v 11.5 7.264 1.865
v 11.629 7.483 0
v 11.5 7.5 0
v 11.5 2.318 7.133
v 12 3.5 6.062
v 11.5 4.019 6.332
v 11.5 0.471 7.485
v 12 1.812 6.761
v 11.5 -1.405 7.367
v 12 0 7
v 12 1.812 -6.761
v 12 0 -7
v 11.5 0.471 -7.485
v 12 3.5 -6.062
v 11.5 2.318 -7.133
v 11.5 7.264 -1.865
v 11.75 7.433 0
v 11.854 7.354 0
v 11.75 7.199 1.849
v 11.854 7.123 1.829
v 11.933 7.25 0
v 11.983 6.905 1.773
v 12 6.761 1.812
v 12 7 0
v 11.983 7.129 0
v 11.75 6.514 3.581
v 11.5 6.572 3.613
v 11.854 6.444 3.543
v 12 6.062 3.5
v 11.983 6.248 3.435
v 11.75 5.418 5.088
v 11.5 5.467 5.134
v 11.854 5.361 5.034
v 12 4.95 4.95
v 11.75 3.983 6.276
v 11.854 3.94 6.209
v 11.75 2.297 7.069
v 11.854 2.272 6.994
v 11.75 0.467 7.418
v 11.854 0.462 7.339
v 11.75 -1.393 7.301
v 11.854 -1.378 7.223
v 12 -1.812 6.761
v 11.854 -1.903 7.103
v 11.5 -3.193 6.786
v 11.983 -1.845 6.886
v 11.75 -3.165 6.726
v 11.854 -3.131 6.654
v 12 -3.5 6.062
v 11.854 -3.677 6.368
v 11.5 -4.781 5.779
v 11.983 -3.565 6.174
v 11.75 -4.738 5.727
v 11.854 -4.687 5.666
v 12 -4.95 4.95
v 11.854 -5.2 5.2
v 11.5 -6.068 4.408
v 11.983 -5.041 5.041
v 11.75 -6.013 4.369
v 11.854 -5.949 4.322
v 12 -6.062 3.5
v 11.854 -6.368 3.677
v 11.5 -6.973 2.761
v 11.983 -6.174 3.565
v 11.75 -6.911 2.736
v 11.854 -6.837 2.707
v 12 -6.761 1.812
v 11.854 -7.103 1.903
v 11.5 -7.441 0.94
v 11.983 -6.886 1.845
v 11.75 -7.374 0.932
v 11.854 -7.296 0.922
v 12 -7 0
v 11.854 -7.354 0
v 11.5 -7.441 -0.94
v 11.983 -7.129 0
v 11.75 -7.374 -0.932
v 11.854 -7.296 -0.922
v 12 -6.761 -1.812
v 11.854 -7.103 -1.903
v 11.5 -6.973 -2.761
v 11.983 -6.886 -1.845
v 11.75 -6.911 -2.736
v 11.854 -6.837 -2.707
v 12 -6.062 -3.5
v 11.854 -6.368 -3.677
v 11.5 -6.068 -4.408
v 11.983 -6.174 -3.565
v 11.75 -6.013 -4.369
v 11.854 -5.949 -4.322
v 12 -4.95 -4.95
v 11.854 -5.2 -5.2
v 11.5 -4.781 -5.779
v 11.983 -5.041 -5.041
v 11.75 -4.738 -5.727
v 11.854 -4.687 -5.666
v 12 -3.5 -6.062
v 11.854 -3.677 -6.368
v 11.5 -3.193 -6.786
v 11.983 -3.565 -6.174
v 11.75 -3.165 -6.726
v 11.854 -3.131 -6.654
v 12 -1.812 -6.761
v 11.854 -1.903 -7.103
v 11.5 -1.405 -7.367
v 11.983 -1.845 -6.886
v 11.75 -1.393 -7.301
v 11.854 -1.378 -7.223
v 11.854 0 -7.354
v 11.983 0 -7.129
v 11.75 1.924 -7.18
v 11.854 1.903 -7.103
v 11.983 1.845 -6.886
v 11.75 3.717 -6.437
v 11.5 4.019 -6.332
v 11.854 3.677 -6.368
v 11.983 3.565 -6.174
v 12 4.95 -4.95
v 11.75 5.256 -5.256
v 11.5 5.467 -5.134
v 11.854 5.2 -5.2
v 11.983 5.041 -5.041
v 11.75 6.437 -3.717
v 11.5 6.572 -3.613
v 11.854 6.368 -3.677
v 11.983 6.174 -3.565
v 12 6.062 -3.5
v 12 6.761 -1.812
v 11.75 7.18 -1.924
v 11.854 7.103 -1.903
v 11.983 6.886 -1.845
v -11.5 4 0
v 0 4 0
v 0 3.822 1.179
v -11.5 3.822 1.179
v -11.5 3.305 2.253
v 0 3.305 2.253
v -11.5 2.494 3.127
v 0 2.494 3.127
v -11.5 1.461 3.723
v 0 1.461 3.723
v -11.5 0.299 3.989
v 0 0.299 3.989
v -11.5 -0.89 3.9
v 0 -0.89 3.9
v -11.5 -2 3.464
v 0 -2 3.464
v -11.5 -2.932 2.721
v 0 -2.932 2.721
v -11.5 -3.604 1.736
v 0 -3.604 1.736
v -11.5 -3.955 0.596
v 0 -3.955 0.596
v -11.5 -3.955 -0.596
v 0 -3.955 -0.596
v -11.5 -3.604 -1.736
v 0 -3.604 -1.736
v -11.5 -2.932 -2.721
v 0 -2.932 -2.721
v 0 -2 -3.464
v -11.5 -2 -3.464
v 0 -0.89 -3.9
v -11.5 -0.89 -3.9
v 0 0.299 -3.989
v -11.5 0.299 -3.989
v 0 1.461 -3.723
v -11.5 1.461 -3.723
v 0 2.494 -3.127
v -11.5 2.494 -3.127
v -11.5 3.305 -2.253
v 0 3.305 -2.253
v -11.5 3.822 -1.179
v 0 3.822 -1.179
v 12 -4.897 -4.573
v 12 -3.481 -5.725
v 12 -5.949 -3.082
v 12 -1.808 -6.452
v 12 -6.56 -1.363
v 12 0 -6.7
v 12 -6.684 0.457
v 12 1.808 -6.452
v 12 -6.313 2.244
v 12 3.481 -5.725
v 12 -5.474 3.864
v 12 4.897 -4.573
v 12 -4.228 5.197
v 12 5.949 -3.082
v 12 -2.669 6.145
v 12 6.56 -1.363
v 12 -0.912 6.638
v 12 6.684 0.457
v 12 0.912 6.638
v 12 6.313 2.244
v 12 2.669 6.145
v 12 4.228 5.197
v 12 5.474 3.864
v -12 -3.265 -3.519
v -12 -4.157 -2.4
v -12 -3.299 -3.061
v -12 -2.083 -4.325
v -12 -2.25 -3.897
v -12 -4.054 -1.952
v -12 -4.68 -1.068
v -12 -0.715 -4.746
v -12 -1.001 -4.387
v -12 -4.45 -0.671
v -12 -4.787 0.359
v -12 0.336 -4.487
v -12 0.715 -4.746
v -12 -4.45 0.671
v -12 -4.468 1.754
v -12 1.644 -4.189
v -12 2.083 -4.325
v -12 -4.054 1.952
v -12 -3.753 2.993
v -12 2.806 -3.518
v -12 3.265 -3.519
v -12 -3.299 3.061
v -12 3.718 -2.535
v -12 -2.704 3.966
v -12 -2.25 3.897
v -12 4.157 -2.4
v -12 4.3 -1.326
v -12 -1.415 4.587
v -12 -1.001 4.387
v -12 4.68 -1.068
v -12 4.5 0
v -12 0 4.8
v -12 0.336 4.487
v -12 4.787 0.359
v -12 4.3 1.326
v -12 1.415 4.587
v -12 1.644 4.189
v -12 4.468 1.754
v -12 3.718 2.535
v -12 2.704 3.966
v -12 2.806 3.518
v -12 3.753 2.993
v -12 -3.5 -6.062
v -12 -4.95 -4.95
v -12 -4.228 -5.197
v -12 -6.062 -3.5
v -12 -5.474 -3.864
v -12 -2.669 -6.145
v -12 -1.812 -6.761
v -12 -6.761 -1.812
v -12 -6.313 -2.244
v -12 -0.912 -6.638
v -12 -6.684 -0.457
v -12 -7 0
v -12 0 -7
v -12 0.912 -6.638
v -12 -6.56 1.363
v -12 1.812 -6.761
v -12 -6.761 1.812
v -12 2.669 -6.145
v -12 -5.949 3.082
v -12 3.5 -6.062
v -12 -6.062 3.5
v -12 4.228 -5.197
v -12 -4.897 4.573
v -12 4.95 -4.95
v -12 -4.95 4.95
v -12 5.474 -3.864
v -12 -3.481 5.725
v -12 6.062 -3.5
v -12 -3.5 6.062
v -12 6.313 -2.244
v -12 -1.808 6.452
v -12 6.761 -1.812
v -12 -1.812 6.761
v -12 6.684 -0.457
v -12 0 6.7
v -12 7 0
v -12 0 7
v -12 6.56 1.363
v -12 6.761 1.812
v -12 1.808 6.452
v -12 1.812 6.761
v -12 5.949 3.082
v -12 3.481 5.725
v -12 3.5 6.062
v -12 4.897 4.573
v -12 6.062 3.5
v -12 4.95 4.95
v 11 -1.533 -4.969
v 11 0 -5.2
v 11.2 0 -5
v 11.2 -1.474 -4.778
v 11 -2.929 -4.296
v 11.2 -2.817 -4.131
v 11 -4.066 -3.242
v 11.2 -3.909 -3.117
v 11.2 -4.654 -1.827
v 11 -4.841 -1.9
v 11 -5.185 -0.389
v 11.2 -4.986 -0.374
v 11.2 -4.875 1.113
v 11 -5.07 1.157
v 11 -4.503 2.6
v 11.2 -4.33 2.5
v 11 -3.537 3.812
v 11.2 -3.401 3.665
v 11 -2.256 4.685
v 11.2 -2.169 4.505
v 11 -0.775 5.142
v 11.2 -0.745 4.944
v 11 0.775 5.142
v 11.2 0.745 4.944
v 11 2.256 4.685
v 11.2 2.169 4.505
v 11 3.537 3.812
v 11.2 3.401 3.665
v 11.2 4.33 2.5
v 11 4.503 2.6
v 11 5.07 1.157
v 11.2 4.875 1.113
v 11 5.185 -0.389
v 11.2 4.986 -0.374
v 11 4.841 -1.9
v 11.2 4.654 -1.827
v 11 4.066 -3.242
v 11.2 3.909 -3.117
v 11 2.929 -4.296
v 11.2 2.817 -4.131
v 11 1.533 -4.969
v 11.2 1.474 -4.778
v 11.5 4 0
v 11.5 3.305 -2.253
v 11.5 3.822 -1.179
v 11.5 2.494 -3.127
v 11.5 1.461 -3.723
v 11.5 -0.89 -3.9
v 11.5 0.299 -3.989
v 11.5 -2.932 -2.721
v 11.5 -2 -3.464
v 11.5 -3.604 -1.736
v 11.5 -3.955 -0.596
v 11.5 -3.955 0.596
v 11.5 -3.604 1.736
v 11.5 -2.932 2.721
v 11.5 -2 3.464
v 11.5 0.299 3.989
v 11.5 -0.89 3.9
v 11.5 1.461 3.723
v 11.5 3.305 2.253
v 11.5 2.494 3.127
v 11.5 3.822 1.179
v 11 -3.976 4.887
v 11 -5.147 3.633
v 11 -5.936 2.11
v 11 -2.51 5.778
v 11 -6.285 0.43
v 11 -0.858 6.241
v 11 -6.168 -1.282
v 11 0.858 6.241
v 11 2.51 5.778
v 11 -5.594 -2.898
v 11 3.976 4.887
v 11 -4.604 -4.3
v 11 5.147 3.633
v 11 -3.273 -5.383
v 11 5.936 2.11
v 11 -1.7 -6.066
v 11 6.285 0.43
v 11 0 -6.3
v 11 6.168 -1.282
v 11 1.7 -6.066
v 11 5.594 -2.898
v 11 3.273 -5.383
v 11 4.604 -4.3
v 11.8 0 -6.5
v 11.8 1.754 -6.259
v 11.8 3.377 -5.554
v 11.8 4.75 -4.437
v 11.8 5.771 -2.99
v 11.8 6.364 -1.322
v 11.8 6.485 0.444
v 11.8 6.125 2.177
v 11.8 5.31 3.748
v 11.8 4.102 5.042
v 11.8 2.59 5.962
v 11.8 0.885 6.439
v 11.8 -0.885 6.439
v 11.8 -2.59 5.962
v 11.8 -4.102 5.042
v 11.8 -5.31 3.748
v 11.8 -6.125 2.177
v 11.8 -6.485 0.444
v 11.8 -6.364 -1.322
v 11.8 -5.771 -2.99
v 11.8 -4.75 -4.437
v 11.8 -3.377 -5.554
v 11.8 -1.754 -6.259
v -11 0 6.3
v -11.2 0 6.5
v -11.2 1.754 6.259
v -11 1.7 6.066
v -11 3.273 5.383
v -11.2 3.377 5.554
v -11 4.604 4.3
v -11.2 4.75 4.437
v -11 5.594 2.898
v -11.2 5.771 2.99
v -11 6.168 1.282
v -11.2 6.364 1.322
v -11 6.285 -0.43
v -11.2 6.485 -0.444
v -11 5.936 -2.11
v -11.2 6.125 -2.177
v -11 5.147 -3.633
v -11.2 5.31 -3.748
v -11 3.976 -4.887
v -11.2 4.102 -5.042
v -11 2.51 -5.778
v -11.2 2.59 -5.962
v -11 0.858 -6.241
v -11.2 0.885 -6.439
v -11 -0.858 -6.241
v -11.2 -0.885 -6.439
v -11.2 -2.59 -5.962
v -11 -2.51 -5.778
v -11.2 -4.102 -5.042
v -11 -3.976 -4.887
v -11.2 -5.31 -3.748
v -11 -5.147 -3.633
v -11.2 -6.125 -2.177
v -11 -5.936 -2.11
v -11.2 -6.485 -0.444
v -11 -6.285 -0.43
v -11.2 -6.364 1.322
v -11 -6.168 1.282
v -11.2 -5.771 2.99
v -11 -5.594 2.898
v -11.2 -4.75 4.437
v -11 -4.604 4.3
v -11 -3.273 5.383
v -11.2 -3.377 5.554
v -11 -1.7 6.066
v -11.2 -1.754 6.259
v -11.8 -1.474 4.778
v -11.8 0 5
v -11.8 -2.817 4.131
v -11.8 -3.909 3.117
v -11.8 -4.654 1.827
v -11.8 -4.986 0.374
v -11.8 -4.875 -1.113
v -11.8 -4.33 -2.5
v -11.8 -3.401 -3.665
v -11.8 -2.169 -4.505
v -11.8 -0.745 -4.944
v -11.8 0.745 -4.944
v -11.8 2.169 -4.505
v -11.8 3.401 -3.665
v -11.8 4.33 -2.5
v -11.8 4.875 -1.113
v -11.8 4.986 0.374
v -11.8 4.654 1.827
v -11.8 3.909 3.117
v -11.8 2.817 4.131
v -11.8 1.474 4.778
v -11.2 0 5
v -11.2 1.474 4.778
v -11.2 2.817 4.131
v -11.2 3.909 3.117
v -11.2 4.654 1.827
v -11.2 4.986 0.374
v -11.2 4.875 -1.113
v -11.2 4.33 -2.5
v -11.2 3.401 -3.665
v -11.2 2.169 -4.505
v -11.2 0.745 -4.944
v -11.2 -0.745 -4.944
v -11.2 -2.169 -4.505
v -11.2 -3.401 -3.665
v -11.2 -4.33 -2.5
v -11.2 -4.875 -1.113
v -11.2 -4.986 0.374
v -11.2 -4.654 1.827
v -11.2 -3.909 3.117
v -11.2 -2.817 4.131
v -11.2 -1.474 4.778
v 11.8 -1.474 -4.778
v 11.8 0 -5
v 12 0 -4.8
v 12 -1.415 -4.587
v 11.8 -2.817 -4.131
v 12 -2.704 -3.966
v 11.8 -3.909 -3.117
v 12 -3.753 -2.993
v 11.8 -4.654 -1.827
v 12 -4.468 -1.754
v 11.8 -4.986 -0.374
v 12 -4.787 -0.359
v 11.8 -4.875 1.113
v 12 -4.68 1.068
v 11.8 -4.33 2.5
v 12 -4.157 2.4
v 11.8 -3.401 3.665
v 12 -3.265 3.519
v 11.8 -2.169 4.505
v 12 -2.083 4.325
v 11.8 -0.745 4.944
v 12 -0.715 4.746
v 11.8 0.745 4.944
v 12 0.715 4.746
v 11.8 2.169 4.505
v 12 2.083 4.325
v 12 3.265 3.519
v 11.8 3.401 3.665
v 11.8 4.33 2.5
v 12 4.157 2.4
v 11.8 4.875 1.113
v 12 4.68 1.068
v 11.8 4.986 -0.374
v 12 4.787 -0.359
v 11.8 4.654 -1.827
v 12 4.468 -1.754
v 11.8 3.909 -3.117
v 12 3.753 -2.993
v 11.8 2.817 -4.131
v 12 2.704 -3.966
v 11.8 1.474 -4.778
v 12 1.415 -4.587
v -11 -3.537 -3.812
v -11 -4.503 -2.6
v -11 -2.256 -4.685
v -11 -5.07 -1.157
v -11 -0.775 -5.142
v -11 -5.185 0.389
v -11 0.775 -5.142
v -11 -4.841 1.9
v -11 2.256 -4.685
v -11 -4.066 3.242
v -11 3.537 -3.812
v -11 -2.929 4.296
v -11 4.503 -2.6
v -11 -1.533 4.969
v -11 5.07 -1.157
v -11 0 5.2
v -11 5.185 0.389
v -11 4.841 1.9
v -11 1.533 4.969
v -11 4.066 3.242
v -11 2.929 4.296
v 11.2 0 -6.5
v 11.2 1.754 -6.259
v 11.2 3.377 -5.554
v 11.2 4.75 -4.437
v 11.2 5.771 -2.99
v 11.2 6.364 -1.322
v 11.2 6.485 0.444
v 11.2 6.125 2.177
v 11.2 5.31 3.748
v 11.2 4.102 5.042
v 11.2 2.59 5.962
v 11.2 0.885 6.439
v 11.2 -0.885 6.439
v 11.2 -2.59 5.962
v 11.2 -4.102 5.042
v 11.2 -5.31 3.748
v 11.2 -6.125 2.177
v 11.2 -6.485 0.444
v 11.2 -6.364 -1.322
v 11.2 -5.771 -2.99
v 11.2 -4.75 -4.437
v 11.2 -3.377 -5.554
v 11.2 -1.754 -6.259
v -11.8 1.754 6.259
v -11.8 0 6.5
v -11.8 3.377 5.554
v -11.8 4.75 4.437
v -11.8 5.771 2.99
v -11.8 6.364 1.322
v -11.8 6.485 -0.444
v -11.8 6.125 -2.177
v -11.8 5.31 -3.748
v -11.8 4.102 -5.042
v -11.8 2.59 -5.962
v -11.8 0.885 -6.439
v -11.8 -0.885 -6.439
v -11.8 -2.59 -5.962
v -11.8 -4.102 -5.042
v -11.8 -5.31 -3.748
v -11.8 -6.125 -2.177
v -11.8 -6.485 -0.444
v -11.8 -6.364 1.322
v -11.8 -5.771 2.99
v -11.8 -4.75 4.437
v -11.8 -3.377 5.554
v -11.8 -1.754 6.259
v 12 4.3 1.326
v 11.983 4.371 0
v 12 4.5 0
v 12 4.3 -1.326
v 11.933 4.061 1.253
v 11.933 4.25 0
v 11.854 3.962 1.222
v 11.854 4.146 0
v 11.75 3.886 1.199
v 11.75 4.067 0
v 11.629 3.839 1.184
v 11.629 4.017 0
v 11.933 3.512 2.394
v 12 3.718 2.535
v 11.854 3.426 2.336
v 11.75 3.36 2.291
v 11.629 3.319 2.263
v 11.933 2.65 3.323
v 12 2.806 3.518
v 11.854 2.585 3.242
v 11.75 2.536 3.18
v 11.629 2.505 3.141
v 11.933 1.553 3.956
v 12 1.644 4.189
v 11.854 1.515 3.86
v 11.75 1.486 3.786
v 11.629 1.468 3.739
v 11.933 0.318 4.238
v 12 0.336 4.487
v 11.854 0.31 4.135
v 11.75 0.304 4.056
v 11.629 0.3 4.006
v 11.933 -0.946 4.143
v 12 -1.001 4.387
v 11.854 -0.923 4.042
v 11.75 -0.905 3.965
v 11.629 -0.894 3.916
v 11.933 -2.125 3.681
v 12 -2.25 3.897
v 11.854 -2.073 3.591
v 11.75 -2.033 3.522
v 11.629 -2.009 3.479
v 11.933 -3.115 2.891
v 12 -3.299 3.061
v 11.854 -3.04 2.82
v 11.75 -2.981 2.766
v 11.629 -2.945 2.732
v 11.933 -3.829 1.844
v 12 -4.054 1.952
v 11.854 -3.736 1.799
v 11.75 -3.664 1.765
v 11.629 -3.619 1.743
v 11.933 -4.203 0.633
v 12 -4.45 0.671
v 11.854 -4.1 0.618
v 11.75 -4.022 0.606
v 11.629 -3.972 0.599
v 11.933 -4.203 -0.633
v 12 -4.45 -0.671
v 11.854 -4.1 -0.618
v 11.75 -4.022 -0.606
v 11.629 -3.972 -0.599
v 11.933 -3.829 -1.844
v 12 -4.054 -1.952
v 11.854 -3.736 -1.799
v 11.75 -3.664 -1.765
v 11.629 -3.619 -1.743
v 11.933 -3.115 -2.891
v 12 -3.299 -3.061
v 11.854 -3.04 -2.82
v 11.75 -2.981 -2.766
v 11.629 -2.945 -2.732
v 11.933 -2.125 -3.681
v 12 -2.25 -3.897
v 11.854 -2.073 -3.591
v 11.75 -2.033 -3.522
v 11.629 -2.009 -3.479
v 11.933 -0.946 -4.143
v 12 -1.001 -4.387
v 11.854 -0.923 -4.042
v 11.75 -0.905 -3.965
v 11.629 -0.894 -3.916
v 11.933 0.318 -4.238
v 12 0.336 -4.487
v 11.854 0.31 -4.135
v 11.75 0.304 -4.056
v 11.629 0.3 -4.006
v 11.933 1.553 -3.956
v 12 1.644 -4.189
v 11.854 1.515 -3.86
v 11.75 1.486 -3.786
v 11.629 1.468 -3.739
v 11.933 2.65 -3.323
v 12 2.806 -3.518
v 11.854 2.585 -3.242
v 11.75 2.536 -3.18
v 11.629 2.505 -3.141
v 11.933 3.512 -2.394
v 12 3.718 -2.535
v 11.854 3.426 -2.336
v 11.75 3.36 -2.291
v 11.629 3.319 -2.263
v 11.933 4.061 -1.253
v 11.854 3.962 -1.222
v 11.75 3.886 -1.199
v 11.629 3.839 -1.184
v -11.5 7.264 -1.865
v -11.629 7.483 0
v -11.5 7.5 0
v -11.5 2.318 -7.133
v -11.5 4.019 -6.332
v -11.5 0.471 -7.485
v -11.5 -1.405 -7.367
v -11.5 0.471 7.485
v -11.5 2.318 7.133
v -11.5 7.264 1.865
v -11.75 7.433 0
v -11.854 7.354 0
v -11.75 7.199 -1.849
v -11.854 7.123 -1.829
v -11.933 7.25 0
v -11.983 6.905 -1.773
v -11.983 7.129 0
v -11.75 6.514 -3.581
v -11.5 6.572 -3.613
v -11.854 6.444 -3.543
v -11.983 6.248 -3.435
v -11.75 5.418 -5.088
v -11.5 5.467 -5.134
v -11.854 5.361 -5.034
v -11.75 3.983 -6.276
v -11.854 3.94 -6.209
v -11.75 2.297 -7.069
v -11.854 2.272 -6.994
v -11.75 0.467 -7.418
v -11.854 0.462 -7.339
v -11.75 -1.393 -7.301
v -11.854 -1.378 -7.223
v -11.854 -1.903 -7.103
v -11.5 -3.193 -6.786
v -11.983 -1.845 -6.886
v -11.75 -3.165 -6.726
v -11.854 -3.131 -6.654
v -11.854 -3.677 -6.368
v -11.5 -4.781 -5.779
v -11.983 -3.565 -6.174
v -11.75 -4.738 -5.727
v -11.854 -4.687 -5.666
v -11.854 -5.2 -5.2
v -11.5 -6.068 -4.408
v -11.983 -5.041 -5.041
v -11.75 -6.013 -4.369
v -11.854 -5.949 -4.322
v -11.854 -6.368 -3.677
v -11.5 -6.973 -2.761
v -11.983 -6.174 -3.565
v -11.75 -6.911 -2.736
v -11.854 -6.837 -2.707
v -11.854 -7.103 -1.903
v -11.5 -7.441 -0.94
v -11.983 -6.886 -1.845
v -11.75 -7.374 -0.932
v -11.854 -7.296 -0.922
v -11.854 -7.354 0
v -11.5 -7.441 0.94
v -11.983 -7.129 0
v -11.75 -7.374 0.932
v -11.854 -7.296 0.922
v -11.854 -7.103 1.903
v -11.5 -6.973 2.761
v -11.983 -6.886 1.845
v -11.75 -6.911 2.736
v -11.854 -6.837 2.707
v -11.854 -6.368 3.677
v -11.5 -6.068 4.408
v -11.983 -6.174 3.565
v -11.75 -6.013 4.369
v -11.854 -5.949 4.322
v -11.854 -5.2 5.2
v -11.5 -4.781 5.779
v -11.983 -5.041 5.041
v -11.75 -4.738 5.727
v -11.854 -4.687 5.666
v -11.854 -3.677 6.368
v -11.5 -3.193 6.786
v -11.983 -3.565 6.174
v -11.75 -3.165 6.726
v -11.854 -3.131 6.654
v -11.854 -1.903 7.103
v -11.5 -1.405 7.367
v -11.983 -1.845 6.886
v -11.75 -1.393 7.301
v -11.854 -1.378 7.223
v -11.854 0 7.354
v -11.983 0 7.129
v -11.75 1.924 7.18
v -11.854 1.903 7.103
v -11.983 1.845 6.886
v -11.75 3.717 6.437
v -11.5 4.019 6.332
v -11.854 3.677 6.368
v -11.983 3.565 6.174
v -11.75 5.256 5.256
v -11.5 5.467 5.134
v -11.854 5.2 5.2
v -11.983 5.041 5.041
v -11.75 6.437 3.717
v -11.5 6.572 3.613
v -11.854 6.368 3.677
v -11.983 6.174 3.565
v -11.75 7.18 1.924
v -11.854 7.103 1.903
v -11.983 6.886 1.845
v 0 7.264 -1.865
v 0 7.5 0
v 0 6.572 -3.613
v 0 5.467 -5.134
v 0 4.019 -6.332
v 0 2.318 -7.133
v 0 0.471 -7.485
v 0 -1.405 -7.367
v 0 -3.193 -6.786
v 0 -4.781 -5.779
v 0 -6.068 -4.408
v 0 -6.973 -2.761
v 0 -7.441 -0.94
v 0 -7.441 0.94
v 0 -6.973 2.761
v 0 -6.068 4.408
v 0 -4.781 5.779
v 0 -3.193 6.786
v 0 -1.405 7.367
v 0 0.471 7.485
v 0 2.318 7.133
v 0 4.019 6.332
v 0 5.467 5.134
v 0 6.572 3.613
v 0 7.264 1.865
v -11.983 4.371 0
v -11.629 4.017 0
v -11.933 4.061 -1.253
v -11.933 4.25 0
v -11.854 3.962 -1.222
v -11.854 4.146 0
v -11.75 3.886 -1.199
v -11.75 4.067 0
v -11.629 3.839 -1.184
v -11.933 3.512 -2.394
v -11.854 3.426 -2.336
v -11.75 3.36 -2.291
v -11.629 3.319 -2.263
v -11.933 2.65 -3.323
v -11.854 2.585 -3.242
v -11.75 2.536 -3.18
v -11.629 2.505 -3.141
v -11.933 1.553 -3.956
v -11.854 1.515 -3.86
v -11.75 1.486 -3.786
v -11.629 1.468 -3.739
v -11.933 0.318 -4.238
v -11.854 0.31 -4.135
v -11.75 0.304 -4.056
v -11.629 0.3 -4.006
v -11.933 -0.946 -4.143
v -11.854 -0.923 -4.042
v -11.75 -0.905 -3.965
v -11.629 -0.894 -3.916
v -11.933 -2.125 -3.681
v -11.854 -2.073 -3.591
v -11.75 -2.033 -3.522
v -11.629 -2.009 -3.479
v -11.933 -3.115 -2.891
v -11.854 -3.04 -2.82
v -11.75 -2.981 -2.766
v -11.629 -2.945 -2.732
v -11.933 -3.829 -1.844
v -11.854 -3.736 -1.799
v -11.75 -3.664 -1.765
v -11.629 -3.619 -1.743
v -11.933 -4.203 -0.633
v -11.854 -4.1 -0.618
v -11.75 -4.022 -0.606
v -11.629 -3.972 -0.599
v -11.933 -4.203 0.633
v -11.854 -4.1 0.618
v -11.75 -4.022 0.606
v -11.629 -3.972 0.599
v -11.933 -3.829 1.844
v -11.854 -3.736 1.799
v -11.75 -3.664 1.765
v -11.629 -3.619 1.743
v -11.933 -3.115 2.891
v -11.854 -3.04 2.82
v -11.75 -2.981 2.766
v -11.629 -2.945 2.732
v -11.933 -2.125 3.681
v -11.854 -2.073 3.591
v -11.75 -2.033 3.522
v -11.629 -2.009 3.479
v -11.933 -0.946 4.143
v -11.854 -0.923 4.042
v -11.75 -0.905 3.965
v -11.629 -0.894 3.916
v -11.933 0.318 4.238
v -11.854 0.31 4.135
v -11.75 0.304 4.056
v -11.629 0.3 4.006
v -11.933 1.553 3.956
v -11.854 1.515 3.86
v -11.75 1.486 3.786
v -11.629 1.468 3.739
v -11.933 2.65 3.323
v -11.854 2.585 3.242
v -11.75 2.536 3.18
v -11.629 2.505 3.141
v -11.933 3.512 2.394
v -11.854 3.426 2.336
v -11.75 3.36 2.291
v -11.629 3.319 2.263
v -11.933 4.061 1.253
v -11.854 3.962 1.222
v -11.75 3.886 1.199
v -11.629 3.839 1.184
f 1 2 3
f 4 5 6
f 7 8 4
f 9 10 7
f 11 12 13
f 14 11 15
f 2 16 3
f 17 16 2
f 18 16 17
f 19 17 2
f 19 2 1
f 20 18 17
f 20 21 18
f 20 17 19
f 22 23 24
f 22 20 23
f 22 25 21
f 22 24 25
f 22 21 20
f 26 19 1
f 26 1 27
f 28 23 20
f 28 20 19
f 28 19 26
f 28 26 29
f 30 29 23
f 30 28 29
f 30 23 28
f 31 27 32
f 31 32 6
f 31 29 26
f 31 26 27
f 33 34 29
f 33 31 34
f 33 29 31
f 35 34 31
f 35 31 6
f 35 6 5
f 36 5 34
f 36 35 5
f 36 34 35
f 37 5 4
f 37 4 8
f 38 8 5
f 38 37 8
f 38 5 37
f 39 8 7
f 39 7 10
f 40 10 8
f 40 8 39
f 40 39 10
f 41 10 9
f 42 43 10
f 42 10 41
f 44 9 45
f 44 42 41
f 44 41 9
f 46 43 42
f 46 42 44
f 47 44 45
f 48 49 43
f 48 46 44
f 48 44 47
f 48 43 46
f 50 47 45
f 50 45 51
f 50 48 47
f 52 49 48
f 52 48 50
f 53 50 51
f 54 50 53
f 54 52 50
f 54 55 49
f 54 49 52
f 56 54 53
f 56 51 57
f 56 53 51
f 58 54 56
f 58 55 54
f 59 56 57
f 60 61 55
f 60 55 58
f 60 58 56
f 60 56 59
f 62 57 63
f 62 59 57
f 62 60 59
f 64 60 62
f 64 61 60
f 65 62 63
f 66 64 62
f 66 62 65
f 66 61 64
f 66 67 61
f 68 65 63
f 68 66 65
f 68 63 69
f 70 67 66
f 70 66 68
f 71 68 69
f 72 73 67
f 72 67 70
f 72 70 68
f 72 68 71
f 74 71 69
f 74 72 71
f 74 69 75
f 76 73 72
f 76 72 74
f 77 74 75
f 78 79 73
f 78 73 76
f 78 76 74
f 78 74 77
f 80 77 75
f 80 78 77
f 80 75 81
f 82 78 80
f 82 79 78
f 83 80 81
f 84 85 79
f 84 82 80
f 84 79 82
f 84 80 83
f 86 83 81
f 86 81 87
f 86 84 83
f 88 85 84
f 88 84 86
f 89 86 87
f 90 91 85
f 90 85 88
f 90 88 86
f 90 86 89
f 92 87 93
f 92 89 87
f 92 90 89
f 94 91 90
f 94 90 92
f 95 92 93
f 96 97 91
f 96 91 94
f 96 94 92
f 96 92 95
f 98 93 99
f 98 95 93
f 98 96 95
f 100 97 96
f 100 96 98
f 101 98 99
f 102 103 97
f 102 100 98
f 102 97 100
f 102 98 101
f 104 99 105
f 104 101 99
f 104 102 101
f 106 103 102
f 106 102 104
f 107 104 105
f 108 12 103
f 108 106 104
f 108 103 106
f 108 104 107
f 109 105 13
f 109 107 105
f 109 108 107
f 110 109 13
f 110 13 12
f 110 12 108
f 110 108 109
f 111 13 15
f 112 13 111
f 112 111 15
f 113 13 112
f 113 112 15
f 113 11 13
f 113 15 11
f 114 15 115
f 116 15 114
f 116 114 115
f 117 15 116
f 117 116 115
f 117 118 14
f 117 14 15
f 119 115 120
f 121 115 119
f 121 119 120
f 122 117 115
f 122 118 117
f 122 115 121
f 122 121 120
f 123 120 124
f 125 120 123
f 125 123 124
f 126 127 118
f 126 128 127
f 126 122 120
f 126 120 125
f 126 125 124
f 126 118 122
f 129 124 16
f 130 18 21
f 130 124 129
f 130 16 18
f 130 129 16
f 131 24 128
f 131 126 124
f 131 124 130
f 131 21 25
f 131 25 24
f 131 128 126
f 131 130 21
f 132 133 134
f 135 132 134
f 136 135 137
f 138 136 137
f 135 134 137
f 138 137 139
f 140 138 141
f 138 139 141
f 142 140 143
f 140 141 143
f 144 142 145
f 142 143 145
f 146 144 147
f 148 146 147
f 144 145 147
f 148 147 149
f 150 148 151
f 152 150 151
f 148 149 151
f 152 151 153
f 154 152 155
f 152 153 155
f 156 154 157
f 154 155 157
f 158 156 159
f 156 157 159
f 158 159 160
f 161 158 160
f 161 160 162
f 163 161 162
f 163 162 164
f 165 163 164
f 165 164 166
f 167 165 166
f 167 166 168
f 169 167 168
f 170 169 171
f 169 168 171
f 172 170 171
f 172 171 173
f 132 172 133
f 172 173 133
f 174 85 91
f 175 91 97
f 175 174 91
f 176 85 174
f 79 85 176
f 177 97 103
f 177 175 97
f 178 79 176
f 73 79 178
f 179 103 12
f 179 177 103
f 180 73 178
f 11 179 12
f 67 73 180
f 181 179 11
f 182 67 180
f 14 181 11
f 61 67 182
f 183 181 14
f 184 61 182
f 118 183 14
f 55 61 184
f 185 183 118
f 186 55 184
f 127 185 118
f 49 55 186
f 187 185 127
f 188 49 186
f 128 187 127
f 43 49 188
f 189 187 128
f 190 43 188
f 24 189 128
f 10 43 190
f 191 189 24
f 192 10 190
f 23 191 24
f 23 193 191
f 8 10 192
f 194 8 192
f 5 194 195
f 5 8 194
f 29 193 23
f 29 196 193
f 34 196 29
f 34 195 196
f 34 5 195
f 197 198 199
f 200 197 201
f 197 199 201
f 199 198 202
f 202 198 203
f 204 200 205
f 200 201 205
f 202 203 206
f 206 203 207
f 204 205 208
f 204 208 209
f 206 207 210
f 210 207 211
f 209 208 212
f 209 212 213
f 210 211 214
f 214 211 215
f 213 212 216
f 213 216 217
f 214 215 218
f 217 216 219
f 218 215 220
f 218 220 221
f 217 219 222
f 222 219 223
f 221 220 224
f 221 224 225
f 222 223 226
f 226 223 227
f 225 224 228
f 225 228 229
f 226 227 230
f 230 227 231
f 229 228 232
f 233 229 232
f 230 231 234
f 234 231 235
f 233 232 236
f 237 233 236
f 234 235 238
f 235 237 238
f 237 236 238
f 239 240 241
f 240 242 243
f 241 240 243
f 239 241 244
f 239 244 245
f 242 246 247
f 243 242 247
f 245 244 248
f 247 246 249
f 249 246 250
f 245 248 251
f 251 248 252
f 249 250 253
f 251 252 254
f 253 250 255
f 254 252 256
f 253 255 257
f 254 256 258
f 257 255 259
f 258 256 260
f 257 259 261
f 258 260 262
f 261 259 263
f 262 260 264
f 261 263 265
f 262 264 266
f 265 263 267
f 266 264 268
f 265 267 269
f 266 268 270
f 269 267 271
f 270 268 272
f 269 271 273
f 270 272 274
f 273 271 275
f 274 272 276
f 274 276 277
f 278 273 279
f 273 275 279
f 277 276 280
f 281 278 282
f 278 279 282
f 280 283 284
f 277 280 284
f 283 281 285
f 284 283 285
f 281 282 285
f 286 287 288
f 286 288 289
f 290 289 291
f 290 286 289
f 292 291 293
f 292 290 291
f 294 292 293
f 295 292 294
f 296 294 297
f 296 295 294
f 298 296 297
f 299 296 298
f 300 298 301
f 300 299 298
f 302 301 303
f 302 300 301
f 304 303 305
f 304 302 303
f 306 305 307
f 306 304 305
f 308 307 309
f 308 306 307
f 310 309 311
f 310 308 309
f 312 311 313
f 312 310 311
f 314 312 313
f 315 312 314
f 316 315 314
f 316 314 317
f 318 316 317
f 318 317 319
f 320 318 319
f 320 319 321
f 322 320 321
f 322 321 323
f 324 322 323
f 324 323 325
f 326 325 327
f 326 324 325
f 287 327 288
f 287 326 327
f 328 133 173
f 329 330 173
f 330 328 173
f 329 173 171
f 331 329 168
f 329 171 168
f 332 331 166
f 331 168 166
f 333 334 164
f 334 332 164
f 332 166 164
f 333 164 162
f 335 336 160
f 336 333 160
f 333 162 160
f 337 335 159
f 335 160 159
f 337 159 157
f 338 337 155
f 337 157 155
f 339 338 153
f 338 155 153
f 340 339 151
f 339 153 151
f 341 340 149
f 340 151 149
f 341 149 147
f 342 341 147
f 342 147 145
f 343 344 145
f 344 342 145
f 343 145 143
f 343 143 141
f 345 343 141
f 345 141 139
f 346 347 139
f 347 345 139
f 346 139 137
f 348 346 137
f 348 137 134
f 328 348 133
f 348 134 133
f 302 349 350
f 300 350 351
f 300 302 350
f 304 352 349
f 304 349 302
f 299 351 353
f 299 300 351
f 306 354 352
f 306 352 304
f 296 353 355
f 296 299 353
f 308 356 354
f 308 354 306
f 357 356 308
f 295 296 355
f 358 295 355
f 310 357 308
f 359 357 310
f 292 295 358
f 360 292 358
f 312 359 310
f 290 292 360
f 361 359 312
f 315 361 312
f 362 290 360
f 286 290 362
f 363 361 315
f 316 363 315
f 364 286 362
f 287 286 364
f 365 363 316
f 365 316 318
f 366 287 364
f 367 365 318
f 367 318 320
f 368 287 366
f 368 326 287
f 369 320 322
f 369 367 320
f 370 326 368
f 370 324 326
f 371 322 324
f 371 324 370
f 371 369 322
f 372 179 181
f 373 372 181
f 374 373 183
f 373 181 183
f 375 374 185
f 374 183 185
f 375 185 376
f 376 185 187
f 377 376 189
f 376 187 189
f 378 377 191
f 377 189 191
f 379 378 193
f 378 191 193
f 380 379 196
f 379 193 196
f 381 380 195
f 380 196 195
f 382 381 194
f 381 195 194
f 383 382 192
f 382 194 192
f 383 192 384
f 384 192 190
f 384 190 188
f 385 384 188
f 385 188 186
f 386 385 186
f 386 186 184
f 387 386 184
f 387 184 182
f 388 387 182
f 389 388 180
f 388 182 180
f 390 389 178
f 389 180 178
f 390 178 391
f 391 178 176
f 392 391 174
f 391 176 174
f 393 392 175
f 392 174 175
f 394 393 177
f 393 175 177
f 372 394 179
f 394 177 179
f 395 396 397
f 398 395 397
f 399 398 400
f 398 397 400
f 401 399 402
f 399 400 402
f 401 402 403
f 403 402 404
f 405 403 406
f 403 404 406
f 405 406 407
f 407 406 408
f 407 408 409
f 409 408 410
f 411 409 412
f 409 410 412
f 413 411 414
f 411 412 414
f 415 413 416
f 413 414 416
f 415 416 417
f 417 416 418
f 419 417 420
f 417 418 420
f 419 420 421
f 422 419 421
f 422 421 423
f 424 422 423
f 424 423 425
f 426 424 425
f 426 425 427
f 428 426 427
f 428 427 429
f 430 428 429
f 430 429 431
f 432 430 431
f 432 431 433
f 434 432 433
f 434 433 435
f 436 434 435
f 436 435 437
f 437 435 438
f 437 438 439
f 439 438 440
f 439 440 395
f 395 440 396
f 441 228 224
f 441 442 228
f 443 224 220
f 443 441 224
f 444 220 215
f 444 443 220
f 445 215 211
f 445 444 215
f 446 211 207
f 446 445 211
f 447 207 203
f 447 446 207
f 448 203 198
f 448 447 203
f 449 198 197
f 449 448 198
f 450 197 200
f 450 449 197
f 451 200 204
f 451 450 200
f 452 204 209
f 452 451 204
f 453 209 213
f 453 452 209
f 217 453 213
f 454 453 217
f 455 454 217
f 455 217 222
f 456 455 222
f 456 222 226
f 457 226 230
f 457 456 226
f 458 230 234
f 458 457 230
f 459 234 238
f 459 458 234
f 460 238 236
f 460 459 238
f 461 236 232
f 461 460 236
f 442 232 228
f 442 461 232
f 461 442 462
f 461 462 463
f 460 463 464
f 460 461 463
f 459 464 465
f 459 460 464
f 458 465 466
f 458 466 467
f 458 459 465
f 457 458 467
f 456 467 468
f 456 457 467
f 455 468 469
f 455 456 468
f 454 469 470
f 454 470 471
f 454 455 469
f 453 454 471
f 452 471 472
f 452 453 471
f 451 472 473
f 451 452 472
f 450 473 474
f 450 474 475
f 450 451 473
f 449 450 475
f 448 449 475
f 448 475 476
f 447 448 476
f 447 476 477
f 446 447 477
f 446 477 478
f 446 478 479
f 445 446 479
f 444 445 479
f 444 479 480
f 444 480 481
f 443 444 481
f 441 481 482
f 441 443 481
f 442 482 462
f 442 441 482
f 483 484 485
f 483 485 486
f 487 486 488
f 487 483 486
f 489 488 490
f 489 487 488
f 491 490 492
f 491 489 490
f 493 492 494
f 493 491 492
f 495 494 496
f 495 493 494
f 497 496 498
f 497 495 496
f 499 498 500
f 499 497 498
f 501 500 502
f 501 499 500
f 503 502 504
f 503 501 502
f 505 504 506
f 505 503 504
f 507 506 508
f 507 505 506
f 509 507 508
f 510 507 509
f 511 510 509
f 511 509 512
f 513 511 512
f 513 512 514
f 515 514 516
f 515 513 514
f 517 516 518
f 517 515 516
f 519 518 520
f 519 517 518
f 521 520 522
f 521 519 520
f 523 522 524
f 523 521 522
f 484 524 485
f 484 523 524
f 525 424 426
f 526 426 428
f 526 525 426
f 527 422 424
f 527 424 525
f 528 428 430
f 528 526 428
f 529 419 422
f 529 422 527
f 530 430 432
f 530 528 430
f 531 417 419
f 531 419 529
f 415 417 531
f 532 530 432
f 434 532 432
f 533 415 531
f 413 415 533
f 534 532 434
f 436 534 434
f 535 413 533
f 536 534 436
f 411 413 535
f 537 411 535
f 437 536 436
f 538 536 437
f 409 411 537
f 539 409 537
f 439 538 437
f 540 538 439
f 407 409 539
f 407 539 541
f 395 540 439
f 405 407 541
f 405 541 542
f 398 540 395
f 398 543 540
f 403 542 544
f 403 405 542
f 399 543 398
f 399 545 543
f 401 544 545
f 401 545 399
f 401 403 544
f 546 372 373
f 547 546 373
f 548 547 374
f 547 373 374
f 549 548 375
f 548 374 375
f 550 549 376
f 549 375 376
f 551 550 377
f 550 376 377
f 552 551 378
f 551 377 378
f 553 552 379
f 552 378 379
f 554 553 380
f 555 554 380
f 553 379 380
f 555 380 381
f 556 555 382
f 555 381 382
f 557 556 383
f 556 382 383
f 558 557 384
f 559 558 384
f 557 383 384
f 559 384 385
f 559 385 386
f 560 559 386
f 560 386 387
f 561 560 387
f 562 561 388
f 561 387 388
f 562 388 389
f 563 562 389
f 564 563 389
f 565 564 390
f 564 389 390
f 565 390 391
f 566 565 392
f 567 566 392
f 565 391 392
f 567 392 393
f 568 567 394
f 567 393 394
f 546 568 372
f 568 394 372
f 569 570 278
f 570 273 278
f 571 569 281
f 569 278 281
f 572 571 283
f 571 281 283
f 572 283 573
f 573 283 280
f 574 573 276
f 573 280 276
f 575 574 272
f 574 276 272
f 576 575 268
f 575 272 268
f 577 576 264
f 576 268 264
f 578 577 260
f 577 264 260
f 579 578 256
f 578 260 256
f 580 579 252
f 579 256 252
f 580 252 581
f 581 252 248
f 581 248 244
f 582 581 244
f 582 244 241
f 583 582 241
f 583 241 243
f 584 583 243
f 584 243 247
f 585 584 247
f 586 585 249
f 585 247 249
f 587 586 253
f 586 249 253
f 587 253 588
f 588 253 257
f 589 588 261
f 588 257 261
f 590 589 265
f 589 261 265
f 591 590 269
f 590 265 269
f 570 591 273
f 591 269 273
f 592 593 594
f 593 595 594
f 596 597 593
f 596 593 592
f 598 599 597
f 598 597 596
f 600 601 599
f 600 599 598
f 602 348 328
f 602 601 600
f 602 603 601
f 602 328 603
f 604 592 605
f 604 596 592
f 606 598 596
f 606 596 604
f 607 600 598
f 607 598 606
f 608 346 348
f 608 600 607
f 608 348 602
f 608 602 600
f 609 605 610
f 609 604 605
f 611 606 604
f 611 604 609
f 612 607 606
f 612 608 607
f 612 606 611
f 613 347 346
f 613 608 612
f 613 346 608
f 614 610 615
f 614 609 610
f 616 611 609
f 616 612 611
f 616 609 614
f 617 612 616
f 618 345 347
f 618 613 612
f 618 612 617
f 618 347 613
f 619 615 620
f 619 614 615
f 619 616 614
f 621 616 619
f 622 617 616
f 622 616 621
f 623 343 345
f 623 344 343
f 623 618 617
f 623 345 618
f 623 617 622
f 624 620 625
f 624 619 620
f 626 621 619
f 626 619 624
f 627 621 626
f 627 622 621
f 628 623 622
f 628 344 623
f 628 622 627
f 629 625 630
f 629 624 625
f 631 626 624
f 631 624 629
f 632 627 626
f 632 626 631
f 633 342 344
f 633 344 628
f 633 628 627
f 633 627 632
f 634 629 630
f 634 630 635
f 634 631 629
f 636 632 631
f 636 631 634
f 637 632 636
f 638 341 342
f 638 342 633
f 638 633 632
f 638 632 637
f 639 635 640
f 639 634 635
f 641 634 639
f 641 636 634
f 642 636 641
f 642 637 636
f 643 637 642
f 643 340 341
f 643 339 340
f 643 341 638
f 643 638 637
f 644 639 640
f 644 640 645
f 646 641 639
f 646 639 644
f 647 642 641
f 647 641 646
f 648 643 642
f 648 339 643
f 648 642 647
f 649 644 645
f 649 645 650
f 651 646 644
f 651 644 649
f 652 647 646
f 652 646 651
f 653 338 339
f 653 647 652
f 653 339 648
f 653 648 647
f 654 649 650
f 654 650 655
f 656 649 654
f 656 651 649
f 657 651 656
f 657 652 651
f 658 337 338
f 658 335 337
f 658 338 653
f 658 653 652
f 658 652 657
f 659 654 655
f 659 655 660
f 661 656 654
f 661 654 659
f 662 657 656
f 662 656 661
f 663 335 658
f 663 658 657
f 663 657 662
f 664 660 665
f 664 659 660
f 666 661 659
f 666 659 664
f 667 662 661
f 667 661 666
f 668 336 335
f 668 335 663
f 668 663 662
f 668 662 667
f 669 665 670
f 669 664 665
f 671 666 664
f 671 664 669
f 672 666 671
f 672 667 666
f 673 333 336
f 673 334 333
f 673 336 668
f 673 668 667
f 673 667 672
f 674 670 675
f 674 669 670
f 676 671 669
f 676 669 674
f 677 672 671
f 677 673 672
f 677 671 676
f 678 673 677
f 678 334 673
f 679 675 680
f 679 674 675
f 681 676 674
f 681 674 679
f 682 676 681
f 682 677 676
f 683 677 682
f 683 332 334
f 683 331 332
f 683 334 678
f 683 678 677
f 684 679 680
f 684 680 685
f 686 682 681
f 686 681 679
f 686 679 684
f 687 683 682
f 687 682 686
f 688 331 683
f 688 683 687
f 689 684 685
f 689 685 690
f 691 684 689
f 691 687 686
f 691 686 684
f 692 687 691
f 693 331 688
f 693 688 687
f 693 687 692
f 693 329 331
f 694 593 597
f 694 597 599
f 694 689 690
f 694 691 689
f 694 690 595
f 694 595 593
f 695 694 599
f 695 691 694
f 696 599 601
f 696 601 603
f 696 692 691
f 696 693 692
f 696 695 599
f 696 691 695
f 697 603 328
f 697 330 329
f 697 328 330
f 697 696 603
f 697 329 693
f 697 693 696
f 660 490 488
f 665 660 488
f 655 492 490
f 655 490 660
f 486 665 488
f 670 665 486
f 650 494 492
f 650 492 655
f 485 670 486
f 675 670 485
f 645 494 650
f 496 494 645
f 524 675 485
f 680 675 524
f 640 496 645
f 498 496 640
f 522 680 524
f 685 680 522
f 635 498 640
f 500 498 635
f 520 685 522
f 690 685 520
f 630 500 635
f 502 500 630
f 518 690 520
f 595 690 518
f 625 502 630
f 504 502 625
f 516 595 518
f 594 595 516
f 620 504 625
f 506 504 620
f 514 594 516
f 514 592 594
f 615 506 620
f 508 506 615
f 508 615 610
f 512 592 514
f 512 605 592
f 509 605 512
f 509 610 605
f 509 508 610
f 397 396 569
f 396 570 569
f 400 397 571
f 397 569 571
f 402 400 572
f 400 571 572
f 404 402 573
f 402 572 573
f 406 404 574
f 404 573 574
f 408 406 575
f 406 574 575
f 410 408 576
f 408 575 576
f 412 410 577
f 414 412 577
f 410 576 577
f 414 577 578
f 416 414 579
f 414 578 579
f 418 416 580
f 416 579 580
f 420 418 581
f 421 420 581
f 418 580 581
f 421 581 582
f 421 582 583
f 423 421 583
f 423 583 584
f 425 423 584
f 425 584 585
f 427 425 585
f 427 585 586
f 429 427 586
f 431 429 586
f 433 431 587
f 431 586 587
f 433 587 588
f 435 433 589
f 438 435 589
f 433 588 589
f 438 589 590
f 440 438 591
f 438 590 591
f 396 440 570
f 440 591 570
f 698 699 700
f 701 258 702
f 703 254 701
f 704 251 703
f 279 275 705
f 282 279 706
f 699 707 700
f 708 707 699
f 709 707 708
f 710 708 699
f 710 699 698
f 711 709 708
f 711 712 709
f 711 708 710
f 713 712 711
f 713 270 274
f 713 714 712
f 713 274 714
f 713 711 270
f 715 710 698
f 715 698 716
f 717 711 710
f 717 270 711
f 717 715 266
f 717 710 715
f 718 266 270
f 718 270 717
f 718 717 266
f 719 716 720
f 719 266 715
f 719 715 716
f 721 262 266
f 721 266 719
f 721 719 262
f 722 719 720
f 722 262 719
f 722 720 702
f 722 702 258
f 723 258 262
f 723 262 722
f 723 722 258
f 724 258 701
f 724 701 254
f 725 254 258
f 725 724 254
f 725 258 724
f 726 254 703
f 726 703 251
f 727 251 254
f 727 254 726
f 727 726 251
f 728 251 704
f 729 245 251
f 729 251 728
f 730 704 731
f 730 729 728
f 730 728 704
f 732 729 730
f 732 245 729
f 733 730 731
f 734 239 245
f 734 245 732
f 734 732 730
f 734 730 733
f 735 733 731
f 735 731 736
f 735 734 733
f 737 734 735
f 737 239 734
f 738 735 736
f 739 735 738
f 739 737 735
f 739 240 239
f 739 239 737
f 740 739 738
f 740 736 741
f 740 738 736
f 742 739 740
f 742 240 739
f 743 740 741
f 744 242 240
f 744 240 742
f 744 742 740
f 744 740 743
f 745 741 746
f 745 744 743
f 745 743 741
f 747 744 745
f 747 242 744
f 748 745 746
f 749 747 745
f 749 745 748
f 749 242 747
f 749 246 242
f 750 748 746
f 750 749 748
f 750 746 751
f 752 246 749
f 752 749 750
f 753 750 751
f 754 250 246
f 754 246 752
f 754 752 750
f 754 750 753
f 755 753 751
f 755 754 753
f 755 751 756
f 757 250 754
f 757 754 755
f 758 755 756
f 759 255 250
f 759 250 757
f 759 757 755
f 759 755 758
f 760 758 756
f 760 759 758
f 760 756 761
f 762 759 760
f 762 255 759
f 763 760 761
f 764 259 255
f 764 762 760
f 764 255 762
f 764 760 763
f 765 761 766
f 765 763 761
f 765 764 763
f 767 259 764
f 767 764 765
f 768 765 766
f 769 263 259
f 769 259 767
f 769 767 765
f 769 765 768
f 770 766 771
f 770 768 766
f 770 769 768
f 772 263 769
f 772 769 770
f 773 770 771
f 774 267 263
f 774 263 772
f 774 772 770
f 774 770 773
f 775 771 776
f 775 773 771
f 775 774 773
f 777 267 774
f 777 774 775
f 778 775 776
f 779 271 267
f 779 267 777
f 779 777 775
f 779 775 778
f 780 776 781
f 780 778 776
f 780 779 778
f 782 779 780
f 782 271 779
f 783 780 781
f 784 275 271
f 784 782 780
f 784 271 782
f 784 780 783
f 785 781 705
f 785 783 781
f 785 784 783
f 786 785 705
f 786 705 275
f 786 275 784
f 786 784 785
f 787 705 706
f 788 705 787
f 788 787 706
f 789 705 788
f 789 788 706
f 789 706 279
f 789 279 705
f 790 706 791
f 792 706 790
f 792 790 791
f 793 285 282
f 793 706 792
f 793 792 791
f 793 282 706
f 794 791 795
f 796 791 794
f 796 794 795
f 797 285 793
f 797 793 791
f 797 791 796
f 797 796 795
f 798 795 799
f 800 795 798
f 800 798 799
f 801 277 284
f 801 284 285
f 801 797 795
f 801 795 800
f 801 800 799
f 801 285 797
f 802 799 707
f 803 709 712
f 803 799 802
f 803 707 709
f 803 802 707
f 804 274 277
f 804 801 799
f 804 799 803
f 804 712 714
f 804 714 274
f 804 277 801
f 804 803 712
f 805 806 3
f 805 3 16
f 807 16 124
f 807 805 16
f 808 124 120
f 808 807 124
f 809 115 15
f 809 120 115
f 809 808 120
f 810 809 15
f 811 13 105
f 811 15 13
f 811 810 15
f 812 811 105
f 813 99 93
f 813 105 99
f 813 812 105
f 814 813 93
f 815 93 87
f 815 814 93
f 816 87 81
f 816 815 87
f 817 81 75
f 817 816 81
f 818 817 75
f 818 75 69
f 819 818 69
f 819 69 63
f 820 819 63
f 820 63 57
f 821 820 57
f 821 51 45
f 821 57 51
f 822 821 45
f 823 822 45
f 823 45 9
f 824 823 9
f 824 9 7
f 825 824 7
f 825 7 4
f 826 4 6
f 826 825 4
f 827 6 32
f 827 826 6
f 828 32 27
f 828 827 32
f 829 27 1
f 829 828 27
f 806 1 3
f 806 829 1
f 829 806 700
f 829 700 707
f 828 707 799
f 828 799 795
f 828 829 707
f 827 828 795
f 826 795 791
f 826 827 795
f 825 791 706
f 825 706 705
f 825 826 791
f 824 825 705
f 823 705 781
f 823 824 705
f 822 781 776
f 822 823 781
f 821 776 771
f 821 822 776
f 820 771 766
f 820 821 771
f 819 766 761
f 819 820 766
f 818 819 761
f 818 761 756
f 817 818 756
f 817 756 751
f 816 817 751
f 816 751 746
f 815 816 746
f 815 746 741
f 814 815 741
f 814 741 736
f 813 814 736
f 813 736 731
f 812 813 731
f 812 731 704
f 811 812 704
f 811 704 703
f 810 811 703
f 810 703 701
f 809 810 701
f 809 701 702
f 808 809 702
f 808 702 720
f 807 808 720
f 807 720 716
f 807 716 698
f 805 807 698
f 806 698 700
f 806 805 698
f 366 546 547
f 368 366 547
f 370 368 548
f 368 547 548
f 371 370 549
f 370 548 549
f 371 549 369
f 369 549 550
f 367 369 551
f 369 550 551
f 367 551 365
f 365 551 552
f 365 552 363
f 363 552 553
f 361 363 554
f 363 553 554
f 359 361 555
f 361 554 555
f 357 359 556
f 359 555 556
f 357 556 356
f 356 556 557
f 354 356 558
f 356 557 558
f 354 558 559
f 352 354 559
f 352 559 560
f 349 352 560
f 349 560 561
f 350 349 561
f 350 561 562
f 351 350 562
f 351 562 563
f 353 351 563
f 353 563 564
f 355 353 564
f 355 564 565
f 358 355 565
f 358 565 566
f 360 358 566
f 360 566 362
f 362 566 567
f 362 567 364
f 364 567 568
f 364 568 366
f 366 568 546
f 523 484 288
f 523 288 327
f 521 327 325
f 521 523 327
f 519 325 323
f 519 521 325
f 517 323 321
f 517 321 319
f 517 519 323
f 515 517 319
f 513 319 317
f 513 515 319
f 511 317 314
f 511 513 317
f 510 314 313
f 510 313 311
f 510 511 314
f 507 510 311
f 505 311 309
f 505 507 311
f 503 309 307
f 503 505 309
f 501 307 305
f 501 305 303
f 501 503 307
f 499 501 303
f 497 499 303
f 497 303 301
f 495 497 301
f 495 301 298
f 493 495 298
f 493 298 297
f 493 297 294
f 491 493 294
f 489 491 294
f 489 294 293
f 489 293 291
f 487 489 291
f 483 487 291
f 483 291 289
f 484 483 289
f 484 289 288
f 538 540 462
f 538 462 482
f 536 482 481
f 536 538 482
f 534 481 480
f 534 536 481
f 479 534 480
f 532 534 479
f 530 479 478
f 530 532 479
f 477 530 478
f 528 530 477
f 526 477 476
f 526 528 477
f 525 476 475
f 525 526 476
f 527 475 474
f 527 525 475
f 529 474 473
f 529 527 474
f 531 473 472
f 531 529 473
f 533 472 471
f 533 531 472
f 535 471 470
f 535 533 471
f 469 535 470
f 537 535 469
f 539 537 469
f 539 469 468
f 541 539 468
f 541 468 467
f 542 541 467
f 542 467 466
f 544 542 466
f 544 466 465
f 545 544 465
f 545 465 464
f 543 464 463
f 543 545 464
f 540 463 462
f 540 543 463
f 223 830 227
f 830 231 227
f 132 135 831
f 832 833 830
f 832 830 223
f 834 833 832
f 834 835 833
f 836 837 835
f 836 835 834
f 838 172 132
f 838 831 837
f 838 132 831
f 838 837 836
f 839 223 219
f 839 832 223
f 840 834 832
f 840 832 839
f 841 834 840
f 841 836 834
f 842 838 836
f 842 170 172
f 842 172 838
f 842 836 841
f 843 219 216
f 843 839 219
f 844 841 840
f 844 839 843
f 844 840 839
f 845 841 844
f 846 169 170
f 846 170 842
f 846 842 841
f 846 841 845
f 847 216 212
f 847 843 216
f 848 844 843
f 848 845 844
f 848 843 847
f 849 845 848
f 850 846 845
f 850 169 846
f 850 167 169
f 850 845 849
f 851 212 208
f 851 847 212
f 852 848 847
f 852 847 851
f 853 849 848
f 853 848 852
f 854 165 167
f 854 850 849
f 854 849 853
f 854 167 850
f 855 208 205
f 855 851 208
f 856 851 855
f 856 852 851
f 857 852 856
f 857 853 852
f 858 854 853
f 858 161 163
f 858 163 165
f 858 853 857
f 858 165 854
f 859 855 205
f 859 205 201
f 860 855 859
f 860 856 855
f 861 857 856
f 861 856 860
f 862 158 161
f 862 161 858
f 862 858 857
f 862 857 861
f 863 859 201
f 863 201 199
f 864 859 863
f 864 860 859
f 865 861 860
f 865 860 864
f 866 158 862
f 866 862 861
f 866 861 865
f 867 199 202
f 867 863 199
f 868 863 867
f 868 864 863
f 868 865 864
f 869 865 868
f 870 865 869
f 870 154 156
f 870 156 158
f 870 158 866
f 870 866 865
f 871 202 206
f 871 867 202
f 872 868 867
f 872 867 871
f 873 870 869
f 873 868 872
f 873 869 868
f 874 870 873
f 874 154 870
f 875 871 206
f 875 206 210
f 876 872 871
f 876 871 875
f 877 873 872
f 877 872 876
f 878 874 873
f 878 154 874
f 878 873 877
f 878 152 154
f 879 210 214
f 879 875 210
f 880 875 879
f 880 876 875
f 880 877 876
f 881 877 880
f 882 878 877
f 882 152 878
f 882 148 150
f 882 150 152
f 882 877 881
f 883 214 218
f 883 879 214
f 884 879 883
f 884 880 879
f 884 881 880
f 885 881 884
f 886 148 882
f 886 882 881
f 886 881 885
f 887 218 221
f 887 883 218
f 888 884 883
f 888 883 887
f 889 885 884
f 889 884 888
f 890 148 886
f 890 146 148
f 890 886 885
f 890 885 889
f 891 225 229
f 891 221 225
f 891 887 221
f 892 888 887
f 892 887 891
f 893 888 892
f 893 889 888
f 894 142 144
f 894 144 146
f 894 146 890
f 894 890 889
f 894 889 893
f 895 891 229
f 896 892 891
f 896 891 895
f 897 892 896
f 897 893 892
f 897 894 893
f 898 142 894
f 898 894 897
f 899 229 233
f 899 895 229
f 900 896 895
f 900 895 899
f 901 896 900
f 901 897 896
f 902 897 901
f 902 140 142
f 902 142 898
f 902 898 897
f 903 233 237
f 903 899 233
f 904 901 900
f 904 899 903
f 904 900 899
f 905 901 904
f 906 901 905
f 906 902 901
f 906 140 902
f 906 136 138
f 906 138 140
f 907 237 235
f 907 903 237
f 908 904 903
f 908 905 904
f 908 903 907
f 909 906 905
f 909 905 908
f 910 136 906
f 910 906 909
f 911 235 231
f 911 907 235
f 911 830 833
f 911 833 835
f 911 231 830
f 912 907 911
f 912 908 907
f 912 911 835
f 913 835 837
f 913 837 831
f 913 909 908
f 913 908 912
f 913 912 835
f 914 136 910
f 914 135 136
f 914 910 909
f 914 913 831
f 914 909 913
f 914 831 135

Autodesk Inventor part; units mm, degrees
ref_plane "YZ Plane" through (0, 0, 0) normal (1, 0, 0) x (0, 1, 0)
ref_plane "XZ Plane" through (0, 0, 0) normal (0, 1, 0) x (-1, 0, 0)
ref_plane "XY Plane" through (0, 0, 0) normal (0, 0, 1) x (1, 0, 0)
sketch "Эскиз1" plane through (0, 0, 0) normal (1, 0, 0) x (0, 1, 0)
  circle A0 centre (0, 0) radius 7.5
  circle A1 centre (0, 0) radius 4
  dimension "d0" = 15
  dimension "d1" = 8
extrude "Выдавливание1" add sketch "Эскиз1" along normal mid plane 24
sketch "Эскиз2" plane through (12, 0, 0) normal (1, 0, 0) x (0, 0, -1)
  circle A0 centre (0, 0) radius 5
  circle A1 centre (0, 0) radius 6.5
  dimension "d4" = 10
  dimension "d5" = 13
extrude "Выдавливание2" cut sketch "Эскиз2" against normal blind 1
sketch "Эскиз3" plane through (-12, 0, 0) normal (-1, 0, 0) x (0, 0, 1)
  circle A0 centre (0, 0) radius 6.5
  circle A1 centre (0, 0) radius 5
  dimension "d9" = 13
  dimension "d10" = 10
extrude "Выдавливание3" cut sketch "Эскиз3" against normal blind 1
fillet "Сопряжение1" radius 0.5 1 edges at (-12, -7.5, 0)
fillet "Сопряжение2" radius 0.5 3 edges at (-12, -4, 0) (12, -7.5, 0) (12, -4, 0)
chamfer "Фаска1" distance 0.2 angle 45 8 edges at (12, 0, 5) (12, 0, 6.5) (-12, 0, -5) (-12, 0, -6.5) (-11, 0, -5) (-11, 0, -6.5) (11, 0, 6.5) (11, 0, 5)
properties part number "LM8UU"
